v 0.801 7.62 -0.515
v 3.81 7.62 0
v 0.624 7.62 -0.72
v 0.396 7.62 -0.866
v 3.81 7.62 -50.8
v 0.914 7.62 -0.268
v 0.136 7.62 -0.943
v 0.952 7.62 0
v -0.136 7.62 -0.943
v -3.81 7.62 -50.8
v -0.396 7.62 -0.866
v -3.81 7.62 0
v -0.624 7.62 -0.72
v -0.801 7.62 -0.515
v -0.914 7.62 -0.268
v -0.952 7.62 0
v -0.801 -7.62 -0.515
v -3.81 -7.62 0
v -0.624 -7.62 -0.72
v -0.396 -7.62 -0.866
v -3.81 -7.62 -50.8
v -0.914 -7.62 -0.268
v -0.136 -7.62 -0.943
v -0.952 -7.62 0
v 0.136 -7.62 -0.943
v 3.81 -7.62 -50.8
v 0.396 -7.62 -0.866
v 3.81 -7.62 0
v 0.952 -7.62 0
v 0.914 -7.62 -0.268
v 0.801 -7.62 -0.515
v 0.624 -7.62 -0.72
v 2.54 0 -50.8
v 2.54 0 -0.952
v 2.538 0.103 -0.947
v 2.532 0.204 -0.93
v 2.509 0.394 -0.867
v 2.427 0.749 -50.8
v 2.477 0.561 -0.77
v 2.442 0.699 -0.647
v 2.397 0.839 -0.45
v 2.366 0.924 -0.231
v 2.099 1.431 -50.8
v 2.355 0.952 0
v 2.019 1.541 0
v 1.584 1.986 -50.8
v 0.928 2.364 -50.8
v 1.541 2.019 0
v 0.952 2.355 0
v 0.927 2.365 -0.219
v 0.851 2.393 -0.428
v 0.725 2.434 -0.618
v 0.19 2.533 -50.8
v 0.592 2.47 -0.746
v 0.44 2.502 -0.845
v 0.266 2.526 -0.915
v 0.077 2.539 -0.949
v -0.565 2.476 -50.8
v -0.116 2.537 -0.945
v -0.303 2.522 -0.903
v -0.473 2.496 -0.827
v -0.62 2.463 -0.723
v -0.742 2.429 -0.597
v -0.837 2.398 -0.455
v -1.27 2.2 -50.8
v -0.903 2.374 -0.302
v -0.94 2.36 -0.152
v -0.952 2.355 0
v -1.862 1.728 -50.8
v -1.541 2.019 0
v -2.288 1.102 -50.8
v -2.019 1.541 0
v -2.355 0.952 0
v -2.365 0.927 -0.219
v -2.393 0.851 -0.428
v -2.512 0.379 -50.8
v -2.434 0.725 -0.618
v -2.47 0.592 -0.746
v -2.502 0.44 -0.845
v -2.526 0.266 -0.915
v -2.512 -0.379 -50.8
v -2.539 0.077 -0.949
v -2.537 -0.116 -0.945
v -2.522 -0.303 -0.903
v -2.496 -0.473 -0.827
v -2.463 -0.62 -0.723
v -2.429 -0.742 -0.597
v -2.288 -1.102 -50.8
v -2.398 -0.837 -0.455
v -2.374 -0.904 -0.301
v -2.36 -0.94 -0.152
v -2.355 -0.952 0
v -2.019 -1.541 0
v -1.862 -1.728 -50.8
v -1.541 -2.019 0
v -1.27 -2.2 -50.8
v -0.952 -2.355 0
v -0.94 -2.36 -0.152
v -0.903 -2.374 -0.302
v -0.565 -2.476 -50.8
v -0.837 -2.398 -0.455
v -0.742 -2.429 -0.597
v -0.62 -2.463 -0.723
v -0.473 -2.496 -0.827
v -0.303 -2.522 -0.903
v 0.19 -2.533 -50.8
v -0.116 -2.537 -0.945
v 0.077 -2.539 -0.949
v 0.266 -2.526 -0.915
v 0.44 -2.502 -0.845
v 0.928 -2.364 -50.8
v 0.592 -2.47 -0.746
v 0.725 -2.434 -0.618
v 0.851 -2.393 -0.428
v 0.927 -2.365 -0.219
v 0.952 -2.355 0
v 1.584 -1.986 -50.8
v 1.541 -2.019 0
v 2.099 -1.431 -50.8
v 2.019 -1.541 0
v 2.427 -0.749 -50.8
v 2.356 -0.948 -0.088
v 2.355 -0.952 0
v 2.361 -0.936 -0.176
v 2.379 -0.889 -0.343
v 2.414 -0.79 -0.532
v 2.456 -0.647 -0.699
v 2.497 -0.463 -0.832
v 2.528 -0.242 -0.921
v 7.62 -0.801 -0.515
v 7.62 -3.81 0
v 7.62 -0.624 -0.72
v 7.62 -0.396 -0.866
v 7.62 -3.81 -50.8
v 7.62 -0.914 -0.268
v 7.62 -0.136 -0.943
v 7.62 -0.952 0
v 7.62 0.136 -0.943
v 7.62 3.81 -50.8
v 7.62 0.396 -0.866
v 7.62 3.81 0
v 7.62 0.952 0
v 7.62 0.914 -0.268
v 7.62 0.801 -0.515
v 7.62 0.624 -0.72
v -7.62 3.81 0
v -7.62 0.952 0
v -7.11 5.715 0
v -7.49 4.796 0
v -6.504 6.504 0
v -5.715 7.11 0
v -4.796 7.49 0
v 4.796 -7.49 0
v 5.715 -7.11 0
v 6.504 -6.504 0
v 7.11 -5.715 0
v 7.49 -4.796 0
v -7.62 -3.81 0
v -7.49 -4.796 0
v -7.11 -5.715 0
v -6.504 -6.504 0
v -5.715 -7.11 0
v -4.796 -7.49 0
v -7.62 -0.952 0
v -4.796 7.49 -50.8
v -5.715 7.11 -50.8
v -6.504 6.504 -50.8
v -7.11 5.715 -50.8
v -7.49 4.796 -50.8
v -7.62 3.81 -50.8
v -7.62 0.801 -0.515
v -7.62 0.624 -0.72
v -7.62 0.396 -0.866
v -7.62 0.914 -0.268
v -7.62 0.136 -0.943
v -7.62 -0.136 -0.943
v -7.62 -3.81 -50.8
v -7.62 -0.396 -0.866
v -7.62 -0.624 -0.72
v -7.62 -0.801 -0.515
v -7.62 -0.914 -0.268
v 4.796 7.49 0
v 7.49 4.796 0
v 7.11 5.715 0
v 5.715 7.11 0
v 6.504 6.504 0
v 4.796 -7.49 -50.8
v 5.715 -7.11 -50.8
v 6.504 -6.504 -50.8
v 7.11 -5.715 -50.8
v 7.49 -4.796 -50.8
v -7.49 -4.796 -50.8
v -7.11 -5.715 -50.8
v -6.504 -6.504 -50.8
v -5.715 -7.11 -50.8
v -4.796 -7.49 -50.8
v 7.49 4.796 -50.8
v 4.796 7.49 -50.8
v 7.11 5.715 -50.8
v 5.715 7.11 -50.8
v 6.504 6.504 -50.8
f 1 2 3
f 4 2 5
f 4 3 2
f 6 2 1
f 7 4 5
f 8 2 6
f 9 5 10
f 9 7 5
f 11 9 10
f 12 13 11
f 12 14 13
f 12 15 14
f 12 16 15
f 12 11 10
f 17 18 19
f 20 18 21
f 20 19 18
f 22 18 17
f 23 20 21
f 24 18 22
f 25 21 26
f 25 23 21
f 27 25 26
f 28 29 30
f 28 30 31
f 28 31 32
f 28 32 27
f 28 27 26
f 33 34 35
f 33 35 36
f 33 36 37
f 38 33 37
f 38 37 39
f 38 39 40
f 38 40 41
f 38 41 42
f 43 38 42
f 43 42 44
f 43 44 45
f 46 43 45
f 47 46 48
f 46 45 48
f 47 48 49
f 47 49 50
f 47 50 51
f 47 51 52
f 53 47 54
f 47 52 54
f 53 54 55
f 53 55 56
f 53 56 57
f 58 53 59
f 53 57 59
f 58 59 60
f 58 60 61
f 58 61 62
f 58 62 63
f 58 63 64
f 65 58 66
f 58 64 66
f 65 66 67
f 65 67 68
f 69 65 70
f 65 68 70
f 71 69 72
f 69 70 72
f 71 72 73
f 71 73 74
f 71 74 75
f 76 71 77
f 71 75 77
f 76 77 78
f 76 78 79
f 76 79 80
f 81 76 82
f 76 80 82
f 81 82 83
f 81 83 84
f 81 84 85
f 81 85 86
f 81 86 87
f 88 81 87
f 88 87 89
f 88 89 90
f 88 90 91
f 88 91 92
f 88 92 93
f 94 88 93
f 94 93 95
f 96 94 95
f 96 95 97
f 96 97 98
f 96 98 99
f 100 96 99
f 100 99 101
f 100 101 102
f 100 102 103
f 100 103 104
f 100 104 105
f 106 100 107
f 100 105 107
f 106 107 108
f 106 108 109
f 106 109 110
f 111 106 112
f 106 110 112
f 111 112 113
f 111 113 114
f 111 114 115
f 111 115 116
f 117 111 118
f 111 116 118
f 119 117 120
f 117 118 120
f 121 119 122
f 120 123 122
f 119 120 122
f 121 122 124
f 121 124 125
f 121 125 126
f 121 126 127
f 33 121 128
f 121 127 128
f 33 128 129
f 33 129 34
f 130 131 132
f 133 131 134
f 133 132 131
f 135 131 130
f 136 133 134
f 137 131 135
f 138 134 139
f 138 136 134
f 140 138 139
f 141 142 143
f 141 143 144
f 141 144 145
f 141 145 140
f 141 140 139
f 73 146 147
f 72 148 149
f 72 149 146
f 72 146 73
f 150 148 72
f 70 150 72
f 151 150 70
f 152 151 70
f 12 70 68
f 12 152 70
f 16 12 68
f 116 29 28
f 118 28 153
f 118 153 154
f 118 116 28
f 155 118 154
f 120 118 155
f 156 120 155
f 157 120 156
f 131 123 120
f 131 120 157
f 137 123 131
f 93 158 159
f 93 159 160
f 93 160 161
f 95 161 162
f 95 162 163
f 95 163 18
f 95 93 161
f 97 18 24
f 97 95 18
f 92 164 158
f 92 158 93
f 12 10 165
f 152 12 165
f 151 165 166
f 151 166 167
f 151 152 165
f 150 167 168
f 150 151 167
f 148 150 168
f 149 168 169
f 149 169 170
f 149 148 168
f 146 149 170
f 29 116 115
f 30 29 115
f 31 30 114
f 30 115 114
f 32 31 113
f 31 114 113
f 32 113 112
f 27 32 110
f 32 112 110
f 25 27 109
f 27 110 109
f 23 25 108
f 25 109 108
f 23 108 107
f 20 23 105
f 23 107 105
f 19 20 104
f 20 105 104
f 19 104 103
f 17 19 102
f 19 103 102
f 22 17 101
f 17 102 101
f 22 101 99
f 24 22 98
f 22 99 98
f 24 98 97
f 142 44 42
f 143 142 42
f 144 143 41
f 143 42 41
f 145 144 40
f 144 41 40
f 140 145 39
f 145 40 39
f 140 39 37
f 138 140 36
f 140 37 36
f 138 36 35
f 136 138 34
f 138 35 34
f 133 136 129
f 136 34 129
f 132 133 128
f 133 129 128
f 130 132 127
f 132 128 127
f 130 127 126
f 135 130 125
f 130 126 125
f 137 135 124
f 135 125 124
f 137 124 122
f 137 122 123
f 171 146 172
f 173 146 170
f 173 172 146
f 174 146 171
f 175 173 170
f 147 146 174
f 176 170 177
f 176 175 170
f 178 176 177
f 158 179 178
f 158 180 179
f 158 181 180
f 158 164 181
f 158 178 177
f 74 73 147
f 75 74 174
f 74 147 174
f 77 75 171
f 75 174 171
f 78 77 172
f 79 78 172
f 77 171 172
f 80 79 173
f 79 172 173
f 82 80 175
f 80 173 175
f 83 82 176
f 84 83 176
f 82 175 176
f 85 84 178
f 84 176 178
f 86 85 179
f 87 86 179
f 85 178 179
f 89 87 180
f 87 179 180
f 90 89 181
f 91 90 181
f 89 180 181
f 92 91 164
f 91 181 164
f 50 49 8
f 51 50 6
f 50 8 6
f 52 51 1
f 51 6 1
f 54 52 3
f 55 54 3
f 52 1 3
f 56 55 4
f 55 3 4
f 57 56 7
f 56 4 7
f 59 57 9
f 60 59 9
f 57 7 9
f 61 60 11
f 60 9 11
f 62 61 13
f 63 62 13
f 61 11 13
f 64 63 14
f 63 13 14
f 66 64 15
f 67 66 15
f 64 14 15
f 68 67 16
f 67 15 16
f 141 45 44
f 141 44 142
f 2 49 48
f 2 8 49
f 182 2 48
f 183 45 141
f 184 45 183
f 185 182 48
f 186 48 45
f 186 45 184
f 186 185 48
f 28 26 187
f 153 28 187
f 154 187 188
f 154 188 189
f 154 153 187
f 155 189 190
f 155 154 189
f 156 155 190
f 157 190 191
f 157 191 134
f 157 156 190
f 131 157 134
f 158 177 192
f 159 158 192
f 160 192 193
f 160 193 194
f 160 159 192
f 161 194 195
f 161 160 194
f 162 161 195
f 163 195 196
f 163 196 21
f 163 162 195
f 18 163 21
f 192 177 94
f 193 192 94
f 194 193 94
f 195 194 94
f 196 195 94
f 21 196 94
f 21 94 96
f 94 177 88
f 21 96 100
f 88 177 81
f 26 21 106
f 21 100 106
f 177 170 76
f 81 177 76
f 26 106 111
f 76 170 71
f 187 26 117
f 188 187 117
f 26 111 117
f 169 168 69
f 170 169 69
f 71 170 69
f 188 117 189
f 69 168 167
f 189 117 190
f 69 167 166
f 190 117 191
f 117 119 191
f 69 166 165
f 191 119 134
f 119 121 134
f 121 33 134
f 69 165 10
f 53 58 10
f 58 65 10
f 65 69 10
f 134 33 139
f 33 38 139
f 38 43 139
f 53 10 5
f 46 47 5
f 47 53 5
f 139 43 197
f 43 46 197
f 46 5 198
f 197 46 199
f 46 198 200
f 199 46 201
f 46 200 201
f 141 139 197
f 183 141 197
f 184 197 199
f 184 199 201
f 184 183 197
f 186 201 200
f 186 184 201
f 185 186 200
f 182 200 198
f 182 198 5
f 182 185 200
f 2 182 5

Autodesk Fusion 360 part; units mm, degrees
sketch "Sketch1" plane through (0, 0, 0) normal (0, 0, 1) x (1, 0, 0)
  line L0 (-7.62, 3.81) -> (-7.62, -3.81)
  line L1 (-3.81, -7.62) -> (3.81, -7.62)
  line L2 (7.62, -3.81) -> (7.62, 3.81)
  line L3 (3.81, 7.62) -> (-3.81, 7.62)
  line L4 (-7.62, 7.62) -> (7.62, -7.62) construction
  line L5 (7.62, 7.62) -> (-7.62, -7.62) construction
  circle A0 centre (0, 0) radius 2.54
  arc A1 (-3.81, 7.62) -> (-7.62, 3.81) centre (-3.81, 3.81) ccw
  arc A2 (-7.62, -3.81) -> (-3.81, -7.62) centre (-3.81, -3.81) ccw
  arc A3 (7.62, 3.81) -> (3.81, 7.62) centre (3.81, 3.81) ccw
  arc A4 (3.81, -7.62) -> (7.62, -3.81) centre (3.81, -3.81) ccw
  dimension "d1" = 5.08
  dimension "d2" = 3.81
  dimension "d3" = 7.62
  dimension "d5" = 3.81
  dimension "d6" = 3.81
  dimension "d7" = 3.81
extrude "Extrude1" add sketch "Sketch1" against normal blind 50.8
sketch "Sketch2" plane through (0, 7.62, 0) normal (0, 1, 0) x (-1, 0, 0)
  line L0 (3.81, 0) -> (-3.81, 0)
  line L1 (3.81, -50.8) -> (3.81, 0)
  line L2 (-3.81, -50.8) -> (3.81, -50.8)
  line L3 (-3.81, 0) -> (-3.81, -50.8)
  circle A0 centre (0, 0) radius 0.9525
  dimension "d11" = 1.905
extrude "Extrude2" cut sketch "Sketch2" against normal through all contours L0 A0 picked at (-0.2327, -0.216)
sketch "Sketch3" plane through (-7.62, 0, 0) normal (-1, 0, 0) x (0, 0, 1)
  line L0 (0, -3.81) -> (0, 3.81)
  line L1 (-50.8, -3.81) -> (0, -3.81)
  line L2 (-50.8, 3.81) -> (-50.8, -3.81)
  line L3 (0, 3.81) -> (-50.8, 3.81)
  circle A0 centre (0, 0) radius 0.9525
  dimension "d13" = 1.905
extrude "Extrude3" cut sketch "Sketch3" against normal through all contours L0 A0 picked at (-0.1378, -0.2861)
equation "d2 = d3 / 2"
equation "d3 = d1 / 2 + WireInsulationLength"
equation "WireInsulationLength = 0.2 in"
equation "d5 = d3 / 2"
equation "d6 = d3 / 2"
equation "d7 = d3 / 2"
equation "d8 = -2\""
equation "WireChannelDiameter = 0.075 in"
equation "d11 = WireChannelDiameter"
equation "d13 = WireChannelDiameter"
